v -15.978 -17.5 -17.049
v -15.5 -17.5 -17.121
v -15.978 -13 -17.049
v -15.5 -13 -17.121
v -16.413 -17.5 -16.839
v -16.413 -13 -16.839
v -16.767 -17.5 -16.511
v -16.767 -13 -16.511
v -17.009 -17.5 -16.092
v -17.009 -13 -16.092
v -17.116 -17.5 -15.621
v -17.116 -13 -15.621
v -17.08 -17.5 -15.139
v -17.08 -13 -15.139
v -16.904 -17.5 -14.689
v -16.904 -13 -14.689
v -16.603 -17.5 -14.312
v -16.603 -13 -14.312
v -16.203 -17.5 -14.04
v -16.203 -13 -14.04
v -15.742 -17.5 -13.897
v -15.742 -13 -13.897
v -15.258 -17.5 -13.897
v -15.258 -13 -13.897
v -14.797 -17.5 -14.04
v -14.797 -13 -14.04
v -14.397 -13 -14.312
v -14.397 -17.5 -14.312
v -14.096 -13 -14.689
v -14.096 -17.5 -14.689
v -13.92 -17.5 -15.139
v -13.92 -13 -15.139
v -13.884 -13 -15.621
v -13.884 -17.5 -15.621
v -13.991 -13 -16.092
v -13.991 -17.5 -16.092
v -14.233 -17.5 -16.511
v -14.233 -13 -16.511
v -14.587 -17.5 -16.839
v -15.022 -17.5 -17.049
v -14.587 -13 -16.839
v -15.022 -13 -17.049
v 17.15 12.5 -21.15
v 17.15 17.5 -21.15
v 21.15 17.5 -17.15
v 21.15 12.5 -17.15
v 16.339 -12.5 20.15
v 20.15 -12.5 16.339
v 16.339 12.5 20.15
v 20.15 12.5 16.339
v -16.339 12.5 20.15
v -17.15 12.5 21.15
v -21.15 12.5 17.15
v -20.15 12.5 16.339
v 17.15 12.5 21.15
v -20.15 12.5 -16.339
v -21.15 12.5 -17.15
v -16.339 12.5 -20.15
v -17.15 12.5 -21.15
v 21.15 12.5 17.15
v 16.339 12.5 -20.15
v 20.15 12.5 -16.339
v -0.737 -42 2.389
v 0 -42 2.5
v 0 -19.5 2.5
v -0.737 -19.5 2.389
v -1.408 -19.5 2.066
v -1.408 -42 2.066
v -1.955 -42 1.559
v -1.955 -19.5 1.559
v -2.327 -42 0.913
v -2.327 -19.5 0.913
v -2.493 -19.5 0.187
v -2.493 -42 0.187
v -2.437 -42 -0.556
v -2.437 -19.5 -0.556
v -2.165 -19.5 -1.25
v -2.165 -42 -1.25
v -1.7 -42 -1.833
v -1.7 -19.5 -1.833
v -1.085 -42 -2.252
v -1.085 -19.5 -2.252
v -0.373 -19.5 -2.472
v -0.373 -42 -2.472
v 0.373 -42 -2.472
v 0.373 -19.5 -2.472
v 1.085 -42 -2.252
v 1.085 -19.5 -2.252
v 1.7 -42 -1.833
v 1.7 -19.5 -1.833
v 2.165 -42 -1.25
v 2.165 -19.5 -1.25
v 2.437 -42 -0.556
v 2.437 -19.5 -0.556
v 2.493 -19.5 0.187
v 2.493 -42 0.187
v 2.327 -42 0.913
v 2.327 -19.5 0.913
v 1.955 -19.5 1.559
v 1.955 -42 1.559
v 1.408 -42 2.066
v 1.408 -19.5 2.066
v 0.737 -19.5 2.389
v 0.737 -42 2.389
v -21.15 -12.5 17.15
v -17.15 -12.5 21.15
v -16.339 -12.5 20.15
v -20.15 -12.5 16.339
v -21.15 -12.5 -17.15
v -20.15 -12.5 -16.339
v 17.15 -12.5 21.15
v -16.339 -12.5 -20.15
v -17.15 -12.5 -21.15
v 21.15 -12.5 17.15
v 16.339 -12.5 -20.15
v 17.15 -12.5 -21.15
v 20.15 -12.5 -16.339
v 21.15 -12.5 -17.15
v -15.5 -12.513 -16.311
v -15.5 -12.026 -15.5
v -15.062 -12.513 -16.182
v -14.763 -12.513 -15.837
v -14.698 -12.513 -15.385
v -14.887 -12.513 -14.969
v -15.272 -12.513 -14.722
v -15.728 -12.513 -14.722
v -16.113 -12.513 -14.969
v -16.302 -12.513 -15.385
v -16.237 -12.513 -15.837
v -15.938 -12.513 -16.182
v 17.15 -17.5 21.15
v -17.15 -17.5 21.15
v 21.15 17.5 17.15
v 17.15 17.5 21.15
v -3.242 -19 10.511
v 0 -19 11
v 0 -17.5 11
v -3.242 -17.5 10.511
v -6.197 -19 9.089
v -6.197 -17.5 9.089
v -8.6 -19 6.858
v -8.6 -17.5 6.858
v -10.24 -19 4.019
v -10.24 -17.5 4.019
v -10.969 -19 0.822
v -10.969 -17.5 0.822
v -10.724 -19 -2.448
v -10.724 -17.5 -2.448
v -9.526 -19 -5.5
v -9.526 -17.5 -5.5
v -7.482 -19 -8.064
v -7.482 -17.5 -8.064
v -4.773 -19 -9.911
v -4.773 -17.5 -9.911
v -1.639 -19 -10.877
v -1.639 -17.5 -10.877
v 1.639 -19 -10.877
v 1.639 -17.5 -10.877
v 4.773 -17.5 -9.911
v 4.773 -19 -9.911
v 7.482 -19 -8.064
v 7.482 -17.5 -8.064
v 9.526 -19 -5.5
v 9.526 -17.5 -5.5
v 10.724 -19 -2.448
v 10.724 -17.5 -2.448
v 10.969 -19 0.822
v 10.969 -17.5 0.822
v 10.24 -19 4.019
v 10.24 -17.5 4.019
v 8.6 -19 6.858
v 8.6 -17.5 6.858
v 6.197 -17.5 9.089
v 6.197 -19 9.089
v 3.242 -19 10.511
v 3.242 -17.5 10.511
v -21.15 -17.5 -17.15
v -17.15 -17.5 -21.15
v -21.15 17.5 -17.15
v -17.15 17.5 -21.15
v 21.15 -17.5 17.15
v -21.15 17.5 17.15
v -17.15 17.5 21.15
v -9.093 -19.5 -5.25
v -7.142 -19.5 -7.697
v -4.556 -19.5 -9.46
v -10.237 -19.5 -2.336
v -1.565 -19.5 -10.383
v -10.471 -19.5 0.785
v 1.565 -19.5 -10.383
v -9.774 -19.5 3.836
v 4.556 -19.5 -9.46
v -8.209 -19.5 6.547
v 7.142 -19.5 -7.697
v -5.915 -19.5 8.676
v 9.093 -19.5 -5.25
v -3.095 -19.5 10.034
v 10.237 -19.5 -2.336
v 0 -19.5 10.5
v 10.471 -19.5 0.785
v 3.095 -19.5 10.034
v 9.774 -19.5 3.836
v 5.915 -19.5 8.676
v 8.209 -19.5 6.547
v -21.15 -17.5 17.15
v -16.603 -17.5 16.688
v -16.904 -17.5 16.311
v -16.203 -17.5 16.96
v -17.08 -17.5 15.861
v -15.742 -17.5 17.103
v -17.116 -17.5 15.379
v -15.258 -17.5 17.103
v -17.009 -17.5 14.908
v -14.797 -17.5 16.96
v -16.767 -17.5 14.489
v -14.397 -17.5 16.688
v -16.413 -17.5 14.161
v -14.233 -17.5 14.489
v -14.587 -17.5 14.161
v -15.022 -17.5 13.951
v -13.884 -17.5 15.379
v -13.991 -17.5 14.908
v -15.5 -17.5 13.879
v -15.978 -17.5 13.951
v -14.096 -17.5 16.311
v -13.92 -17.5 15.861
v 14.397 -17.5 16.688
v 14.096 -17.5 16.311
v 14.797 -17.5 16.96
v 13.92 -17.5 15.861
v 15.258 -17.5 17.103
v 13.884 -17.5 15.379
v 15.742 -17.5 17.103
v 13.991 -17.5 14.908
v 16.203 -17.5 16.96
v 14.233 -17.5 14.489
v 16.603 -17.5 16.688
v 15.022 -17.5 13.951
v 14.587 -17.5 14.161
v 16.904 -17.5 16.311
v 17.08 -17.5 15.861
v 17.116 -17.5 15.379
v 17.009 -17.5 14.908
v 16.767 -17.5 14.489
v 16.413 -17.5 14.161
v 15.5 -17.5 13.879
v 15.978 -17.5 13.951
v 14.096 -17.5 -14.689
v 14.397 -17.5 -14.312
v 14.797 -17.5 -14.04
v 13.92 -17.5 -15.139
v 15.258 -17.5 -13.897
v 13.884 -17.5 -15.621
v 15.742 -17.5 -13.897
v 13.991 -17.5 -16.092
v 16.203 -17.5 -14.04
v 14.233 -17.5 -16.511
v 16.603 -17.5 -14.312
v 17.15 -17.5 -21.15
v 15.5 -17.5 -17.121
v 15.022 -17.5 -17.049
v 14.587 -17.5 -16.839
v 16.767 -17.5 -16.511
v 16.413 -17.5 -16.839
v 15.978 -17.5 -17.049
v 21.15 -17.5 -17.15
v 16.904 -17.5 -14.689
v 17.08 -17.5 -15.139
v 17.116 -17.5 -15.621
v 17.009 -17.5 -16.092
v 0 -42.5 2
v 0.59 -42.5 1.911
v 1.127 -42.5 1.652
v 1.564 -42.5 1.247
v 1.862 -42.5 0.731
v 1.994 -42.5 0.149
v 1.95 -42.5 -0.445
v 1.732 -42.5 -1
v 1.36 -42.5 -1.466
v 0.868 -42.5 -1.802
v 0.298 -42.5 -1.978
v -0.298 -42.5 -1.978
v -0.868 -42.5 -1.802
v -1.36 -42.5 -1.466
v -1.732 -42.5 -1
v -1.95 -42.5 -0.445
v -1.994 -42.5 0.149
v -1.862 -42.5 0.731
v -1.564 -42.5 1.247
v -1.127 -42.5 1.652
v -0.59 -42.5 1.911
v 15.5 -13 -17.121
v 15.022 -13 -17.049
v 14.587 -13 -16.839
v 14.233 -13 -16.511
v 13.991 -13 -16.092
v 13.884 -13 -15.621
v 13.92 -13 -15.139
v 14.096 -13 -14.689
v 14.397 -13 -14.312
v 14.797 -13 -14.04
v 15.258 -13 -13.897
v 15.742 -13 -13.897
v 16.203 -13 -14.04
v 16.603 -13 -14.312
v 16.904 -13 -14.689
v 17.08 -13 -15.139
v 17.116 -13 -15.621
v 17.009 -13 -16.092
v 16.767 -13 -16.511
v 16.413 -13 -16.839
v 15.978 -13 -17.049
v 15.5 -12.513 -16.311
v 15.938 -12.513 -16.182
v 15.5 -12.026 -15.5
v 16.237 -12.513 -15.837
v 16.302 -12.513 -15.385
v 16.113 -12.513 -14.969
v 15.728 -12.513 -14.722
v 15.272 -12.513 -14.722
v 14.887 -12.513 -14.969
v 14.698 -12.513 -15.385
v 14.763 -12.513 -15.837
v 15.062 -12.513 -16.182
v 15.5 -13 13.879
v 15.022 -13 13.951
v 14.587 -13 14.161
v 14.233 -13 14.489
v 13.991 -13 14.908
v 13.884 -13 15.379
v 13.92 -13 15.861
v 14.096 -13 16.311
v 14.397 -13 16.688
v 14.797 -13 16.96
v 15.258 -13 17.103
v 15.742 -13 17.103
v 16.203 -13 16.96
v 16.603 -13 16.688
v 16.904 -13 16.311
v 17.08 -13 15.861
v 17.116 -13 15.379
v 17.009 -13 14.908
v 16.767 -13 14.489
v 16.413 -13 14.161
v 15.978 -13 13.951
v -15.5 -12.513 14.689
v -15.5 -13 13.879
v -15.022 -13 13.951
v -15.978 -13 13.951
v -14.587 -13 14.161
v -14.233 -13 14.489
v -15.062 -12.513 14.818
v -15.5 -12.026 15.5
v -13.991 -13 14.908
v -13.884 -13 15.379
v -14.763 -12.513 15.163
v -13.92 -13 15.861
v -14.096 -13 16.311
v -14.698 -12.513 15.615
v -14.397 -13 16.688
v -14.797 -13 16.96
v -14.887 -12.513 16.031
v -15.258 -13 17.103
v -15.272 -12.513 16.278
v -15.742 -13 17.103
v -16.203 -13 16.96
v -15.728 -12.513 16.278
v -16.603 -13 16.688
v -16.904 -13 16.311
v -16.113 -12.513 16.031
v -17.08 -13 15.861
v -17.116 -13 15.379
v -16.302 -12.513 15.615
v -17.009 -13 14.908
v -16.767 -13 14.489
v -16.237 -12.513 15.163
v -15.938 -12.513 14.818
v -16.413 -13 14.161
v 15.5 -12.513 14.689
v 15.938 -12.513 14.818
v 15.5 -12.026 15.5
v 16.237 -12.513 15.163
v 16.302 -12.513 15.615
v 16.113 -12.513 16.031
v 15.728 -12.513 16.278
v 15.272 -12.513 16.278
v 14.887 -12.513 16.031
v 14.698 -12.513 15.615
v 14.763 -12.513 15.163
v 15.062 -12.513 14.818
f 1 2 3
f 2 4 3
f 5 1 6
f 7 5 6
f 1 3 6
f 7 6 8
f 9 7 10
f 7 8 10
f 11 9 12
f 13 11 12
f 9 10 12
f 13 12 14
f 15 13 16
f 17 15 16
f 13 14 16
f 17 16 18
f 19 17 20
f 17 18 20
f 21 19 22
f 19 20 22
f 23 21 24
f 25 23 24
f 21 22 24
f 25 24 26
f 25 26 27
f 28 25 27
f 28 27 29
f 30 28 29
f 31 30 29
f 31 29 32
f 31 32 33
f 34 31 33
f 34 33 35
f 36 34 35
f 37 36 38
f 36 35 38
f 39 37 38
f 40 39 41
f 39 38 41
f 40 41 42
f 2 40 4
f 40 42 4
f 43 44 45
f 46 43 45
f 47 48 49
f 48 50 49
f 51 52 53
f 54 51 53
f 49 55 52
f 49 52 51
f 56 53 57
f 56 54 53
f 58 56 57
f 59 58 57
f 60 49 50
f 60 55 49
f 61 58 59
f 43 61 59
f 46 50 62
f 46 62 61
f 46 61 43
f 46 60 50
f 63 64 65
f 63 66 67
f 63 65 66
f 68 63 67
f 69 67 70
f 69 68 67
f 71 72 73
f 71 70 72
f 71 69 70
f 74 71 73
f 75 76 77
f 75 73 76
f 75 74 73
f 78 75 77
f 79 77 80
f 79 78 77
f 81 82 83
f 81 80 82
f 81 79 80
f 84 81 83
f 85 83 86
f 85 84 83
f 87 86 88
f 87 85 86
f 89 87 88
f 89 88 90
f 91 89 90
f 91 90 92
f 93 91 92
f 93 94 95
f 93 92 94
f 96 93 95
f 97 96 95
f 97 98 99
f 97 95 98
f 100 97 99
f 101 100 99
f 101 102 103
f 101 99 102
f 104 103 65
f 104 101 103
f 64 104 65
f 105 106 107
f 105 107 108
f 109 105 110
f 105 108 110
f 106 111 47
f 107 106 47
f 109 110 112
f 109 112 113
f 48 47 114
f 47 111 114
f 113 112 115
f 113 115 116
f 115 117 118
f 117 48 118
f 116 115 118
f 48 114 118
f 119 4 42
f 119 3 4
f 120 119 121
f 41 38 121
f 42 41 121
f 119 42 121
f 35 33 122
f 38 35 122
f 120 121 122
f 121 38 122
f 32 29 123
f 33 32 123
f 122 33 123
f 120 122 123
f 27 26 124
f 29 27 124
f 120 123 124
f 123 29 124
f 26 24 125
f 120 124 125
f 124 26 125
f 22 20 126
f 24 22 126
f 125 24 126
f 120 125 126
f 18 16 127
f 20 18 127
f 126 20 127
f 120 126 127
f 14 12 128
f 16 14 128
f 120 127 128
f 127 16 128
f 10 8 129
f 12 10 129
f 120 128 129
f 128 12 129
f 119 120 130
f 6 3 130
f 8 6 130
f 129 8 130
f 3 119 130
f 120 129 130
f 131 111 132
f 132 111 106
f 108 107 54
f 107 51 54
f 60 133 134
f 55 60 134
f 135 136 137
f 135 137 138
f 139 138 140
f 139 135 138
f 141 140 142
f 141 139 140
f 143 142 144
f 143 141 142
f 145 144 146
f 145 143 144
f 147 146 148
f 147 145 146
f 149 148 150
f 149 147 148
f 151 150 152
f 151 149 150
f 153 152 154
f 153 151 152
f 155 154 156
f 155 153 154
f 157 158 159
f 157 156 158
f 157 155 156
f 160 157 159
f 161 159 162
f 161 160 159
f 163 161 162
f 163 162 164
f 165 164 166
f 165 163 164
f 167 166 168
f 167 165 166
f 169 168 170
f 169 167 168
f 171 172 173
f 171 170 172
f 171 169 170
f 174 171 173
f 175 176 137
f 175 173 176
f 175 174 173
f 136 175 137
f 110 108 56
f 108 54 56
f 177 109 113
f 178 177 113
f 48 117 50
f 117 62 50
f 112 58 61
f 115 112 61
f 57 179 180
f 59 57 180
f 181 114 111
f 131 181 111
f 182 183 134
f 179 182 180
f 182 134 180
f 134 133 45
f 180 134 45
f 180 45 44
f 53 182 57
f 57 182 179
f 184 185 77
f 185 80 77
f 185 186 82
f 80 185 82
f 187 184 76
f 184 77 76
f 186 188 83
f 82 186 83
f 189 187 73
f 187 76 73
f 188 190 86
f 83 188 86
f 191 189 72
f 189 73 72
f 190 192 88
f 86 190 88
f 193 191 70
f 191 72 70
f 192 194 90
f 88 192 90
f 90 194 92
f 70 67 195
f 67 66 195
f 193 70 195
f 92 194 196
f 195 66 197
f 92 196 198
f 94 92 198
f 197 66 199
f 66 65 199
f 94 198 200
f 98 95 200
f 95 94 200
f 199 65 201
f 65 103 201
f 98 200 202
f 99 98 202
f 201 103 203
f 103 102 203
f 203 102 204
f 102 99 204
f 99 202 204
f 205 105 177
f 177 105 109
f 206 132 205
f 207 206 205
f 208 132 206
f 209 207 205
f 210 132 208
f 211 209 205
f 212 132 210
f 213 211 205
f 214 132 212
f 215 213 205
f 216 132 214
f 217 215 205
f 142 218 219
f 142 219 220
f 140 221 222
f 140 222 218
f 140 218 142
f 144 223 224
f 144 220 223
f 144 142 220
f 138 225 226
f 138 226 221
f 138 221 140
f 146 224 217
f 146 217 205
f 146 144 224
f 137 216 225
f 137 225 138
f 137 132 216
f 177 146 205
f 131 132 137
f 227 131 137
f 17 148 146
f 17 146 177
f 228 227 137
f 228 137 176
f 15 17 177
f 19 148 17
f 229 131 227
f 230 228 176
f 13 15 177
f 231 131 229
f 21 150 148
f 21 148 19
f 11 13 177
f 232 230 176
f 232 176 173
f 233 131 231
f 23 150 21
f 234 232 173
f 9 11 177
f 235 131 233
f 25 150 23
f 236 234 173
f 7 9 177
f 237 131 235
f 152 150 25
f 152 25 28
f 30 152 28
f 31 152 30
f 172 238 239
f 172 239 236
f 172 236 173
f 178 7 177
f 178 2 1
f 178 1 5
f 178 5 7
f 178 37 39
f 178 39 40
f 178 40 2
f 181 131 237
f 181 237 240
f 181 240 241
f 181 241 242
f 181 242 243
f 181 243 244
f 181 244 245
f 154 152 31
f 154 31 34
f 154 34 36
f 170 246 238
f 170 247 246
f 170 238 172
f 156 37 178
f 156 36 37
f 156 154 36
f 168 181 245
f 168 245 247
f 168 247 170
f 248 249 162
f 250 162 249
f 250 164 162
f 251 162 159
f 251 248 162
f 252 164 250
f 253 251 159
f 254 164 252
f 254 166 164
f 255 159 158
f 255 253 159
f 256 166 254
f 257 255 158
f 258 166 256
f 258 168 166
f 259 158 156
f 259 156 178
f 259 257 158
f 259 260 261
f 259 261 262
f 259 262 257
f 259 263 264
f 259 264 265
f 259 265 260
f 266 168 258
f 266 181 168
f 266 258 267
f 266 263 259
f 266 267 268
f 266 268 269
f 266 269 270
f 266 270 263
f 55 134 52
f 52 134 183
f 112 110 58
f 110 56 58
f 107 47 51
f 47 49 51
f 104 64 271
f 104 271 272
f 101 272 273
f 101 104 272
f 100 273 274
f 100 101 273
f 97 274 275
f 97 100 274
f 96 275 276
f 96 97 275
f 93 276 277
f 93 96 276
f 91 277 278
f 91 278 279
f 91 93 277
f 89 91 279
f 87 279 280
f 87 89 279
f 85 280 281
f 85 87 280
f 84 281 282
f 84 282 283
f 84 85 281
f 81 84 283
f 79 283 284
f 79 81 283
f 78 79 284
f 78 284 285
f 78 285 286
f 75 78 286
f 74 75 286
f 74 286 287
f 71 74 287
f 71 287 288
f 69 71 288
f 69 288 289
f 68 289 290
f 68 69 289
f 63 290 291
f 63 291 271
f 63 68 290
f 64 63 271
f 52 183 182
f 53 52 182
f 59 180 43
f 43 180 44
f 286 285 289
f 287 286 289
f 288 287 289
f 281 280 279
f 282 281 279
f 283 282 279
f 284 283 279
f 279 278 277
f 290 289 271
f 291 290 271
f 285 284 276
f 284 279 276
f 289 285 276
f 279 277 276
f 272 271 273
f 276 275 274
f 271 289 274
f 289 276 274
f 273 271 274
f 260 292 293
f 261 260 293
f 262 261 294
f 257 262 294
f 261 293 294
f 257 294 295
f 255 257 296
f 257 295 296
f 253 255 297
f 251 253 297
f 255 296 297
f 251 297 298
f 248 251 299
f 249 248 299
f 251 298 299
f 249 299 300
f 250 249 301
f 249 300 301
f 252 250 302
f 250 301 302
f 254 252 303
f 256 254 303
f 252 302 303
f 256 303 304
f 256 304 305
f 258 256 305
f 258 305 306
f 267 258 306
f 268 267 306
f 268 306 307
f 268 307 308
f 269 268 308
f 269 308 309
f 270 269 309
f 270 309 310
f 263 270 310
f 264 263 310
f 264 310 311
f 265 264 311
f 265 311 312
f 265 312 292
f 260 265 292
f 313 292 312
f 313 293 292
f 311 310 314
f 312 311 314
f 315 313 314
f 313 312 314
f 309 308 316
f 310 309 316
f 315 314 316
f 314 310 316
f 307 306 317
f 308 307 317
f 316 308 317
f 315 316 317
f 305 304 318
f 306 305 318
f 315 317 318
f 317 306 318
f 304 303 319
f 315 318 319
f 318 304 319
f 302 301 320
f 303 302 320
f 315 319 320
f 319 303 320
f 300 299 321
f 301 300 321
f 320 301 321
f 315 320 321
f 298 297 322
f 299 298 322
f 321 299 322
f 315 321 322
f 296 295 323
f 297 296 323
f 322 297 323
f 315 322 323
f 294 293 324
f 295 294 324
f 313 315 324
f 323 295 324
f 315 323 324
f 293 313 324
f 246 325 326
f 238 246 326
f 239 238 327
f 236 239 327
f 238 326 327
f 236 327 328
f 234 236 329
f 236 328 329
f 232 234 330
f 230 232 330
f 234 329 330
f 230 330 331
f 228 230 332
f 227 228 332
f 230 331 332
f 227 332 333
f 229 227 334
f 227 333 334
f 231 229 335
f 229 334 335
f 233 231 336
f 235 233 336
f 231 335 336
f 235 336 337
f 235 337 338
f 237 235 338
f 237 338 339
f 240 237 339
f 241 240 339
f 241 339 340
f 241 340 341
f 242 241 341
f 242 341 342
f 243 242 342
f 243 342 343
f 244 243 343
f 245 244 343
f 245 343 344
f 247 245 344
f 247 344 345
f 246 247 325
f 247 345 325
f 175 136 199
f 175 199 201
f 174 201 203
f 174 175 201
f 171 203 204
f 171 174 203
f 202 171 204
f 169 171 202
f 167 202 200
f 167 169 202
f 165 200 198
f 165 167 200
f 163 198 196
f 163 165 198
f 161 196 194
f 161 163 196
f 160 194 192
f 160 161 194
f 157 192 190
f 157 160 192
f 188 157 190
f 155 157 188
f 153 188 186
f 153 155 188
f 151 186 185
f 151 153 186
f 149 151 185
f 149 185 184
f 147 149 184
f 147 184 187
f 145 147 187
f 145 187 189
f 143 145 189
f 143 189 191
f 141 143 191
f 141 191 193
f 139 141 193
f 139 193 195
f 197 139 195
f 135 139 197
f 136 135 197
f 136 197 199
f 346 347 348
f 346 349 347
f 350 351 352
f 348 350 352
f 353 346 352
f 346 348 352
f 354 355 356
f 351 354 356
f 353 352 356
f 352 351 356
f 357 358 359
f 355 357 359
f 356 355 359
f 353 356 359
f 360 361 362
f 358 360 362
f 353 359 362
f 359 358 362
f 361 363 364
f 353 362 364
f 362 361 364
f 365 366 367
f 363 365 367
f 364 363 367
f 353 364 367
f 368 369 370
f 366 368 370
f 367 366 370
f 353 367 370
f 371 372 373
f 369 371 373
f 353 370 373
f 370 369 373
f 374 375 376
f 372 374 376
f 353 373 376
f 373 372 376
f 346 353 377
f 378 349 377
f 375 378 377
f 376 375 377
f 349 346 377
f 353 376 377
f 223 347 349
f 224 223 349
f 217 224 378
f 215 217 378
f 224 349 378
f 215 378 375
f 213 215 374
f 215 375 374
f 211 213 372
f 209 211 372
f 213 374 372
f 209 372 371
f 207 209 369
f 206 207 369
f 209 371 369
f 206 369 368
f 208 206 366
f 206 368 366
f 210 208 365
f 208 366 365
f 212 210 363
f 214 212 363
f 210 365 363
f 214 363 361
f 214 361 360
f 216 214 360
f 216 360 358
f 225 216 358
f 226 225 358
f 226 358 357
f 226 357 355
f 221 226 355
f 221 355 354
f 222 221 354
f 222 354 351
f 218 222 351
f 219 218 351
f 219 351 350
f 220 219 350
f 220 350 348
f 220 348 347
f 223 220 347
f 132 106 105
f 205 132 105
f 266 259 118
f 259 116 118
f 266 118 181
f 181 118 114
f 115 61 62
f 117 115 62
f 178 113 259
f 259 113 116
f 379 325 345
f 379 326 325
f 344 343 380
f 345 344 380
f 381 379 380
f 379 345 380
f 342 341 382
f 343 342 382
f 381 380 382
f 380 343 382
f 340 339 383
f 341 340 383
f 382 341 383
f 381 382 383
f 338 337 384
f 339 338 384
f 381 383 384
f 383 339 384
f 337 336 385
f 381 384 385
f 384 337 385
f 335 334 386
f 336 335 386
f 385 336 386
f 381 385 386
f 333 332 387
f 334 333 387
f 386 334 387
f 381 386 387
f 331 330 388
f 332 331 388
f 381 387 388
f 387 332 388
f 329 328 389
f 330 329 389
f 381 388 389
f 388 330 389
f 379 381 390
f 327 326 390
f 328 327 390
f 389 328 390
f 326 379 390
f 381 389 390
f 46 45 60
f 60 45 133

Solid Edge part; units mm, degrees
sketch "Sketch1" plane through (0, 0, 0) normal (0, -1, 0) x (1, 0, 0)
  line L0 (-21.15, 17.15) -> (-21.15, -17.15)
  line L1 (-21.15, -17.15) -> (-17.15, -21.15)
  line L2 (-17.15, -21.15) -> (17.15, -21.15)
  line L3 (17.15, -21.15) -> (21.15, -17.15)
  line L4 (21.15, -17.15) -> (21.15, 17.15)
  line L5 (21.15, 17.15) -> (17.15, 21.15)
  line L6 (17.15, 21.15) -> (-17.15, 21.15)
  line L7 (-17.15, 21.15) -> (-21.15, 17.15)
  dimension "D1" = 42.3
  dimension "D2" = 4
extrude "Protrusion1" add sketch "Sketch1" along normal mid plane 35
sketch "Sketch2" plane through (0, 0, 0) normal (0, -1, 0) x (1, 0, 0)
  line L0 (-20.15, 16.3391) -> (-20.15, -16.3391)
  line L1 (-20.15, -16.3391) -> (-16.3391, -20.15)
  line L2 (-16.3391, -20.15) -> (16.3391, -20.15)
  line L3 (16.3391, -20.15) -> (20.15, -16.3391)
  line L4 (20.15, -16.3391) -> (20.15, 16.3391)
  line L5 (20.15, 16.3391) -> (16.3391, 20.15)
  line L6 (16.3391, 20.15) -> (-16.3391, 20.15)
  line L7 (-16.3391, 20.15) -> (-20.15, 16.3391)
  dimension "D1" = 1
extrude "ExtrudedCutout_1" cut sketch "Sketch2" along normal mid plane 25 flip side to cut
sketch "Sketch3" plane through (0, 0, 0) normal (1, 0, 0) x (0, 1, 0)
  line L0 (-17.5, 0) -> (-17.5, 11)
  line L1 (-17.5, 11) -> (-19.5, 11)
  line L2 (-19.5, 11) -> (-19.5, 2.5)
  line L3 (-19.5, 2.5) -> (-42.5, 2.5)
  line L4 (-42.5, 2.5) -> (-42.5, 0)
  dimension "D1" = 25
  dimension "D2" = 2
revolve "RevolvedProtrusion1" add sketch "Sketch3" angle 360 about axis through (0, -46, 0) along (0, 1, 0)
chamfer "Chamfer_1" distance 0.5 angle 45 2 edges at (0, -19.5, 11) (0, -42.5, 2.5)
hole "Hole_1" at (-15.5, -17.5, -15.5) direction (0, 1, 0) diameter 3.242 depth 4.5 tip angle 118 thread major 4 thread length 4
hole "Hole1" at (-15.5, -17.5, 15.5) direction (0, 1, 0) diameter 3.242 depth 4.5 tip angle 118 thread major 4 thread length 4
hole "Hole2" at (15.5, -17.5, -15.5) direction (0, 1, 0) diameter 3.242 depth 4.5 tip angle 118 thread major 4 thread length 4
hole "Hole3" at (15.5, -17.5, 15.5) direction (0, 1, 0) diameter 3.242 depth 4.5 tip angle 118 thread major 4 thread length 4
properties material "Stainless steel"
